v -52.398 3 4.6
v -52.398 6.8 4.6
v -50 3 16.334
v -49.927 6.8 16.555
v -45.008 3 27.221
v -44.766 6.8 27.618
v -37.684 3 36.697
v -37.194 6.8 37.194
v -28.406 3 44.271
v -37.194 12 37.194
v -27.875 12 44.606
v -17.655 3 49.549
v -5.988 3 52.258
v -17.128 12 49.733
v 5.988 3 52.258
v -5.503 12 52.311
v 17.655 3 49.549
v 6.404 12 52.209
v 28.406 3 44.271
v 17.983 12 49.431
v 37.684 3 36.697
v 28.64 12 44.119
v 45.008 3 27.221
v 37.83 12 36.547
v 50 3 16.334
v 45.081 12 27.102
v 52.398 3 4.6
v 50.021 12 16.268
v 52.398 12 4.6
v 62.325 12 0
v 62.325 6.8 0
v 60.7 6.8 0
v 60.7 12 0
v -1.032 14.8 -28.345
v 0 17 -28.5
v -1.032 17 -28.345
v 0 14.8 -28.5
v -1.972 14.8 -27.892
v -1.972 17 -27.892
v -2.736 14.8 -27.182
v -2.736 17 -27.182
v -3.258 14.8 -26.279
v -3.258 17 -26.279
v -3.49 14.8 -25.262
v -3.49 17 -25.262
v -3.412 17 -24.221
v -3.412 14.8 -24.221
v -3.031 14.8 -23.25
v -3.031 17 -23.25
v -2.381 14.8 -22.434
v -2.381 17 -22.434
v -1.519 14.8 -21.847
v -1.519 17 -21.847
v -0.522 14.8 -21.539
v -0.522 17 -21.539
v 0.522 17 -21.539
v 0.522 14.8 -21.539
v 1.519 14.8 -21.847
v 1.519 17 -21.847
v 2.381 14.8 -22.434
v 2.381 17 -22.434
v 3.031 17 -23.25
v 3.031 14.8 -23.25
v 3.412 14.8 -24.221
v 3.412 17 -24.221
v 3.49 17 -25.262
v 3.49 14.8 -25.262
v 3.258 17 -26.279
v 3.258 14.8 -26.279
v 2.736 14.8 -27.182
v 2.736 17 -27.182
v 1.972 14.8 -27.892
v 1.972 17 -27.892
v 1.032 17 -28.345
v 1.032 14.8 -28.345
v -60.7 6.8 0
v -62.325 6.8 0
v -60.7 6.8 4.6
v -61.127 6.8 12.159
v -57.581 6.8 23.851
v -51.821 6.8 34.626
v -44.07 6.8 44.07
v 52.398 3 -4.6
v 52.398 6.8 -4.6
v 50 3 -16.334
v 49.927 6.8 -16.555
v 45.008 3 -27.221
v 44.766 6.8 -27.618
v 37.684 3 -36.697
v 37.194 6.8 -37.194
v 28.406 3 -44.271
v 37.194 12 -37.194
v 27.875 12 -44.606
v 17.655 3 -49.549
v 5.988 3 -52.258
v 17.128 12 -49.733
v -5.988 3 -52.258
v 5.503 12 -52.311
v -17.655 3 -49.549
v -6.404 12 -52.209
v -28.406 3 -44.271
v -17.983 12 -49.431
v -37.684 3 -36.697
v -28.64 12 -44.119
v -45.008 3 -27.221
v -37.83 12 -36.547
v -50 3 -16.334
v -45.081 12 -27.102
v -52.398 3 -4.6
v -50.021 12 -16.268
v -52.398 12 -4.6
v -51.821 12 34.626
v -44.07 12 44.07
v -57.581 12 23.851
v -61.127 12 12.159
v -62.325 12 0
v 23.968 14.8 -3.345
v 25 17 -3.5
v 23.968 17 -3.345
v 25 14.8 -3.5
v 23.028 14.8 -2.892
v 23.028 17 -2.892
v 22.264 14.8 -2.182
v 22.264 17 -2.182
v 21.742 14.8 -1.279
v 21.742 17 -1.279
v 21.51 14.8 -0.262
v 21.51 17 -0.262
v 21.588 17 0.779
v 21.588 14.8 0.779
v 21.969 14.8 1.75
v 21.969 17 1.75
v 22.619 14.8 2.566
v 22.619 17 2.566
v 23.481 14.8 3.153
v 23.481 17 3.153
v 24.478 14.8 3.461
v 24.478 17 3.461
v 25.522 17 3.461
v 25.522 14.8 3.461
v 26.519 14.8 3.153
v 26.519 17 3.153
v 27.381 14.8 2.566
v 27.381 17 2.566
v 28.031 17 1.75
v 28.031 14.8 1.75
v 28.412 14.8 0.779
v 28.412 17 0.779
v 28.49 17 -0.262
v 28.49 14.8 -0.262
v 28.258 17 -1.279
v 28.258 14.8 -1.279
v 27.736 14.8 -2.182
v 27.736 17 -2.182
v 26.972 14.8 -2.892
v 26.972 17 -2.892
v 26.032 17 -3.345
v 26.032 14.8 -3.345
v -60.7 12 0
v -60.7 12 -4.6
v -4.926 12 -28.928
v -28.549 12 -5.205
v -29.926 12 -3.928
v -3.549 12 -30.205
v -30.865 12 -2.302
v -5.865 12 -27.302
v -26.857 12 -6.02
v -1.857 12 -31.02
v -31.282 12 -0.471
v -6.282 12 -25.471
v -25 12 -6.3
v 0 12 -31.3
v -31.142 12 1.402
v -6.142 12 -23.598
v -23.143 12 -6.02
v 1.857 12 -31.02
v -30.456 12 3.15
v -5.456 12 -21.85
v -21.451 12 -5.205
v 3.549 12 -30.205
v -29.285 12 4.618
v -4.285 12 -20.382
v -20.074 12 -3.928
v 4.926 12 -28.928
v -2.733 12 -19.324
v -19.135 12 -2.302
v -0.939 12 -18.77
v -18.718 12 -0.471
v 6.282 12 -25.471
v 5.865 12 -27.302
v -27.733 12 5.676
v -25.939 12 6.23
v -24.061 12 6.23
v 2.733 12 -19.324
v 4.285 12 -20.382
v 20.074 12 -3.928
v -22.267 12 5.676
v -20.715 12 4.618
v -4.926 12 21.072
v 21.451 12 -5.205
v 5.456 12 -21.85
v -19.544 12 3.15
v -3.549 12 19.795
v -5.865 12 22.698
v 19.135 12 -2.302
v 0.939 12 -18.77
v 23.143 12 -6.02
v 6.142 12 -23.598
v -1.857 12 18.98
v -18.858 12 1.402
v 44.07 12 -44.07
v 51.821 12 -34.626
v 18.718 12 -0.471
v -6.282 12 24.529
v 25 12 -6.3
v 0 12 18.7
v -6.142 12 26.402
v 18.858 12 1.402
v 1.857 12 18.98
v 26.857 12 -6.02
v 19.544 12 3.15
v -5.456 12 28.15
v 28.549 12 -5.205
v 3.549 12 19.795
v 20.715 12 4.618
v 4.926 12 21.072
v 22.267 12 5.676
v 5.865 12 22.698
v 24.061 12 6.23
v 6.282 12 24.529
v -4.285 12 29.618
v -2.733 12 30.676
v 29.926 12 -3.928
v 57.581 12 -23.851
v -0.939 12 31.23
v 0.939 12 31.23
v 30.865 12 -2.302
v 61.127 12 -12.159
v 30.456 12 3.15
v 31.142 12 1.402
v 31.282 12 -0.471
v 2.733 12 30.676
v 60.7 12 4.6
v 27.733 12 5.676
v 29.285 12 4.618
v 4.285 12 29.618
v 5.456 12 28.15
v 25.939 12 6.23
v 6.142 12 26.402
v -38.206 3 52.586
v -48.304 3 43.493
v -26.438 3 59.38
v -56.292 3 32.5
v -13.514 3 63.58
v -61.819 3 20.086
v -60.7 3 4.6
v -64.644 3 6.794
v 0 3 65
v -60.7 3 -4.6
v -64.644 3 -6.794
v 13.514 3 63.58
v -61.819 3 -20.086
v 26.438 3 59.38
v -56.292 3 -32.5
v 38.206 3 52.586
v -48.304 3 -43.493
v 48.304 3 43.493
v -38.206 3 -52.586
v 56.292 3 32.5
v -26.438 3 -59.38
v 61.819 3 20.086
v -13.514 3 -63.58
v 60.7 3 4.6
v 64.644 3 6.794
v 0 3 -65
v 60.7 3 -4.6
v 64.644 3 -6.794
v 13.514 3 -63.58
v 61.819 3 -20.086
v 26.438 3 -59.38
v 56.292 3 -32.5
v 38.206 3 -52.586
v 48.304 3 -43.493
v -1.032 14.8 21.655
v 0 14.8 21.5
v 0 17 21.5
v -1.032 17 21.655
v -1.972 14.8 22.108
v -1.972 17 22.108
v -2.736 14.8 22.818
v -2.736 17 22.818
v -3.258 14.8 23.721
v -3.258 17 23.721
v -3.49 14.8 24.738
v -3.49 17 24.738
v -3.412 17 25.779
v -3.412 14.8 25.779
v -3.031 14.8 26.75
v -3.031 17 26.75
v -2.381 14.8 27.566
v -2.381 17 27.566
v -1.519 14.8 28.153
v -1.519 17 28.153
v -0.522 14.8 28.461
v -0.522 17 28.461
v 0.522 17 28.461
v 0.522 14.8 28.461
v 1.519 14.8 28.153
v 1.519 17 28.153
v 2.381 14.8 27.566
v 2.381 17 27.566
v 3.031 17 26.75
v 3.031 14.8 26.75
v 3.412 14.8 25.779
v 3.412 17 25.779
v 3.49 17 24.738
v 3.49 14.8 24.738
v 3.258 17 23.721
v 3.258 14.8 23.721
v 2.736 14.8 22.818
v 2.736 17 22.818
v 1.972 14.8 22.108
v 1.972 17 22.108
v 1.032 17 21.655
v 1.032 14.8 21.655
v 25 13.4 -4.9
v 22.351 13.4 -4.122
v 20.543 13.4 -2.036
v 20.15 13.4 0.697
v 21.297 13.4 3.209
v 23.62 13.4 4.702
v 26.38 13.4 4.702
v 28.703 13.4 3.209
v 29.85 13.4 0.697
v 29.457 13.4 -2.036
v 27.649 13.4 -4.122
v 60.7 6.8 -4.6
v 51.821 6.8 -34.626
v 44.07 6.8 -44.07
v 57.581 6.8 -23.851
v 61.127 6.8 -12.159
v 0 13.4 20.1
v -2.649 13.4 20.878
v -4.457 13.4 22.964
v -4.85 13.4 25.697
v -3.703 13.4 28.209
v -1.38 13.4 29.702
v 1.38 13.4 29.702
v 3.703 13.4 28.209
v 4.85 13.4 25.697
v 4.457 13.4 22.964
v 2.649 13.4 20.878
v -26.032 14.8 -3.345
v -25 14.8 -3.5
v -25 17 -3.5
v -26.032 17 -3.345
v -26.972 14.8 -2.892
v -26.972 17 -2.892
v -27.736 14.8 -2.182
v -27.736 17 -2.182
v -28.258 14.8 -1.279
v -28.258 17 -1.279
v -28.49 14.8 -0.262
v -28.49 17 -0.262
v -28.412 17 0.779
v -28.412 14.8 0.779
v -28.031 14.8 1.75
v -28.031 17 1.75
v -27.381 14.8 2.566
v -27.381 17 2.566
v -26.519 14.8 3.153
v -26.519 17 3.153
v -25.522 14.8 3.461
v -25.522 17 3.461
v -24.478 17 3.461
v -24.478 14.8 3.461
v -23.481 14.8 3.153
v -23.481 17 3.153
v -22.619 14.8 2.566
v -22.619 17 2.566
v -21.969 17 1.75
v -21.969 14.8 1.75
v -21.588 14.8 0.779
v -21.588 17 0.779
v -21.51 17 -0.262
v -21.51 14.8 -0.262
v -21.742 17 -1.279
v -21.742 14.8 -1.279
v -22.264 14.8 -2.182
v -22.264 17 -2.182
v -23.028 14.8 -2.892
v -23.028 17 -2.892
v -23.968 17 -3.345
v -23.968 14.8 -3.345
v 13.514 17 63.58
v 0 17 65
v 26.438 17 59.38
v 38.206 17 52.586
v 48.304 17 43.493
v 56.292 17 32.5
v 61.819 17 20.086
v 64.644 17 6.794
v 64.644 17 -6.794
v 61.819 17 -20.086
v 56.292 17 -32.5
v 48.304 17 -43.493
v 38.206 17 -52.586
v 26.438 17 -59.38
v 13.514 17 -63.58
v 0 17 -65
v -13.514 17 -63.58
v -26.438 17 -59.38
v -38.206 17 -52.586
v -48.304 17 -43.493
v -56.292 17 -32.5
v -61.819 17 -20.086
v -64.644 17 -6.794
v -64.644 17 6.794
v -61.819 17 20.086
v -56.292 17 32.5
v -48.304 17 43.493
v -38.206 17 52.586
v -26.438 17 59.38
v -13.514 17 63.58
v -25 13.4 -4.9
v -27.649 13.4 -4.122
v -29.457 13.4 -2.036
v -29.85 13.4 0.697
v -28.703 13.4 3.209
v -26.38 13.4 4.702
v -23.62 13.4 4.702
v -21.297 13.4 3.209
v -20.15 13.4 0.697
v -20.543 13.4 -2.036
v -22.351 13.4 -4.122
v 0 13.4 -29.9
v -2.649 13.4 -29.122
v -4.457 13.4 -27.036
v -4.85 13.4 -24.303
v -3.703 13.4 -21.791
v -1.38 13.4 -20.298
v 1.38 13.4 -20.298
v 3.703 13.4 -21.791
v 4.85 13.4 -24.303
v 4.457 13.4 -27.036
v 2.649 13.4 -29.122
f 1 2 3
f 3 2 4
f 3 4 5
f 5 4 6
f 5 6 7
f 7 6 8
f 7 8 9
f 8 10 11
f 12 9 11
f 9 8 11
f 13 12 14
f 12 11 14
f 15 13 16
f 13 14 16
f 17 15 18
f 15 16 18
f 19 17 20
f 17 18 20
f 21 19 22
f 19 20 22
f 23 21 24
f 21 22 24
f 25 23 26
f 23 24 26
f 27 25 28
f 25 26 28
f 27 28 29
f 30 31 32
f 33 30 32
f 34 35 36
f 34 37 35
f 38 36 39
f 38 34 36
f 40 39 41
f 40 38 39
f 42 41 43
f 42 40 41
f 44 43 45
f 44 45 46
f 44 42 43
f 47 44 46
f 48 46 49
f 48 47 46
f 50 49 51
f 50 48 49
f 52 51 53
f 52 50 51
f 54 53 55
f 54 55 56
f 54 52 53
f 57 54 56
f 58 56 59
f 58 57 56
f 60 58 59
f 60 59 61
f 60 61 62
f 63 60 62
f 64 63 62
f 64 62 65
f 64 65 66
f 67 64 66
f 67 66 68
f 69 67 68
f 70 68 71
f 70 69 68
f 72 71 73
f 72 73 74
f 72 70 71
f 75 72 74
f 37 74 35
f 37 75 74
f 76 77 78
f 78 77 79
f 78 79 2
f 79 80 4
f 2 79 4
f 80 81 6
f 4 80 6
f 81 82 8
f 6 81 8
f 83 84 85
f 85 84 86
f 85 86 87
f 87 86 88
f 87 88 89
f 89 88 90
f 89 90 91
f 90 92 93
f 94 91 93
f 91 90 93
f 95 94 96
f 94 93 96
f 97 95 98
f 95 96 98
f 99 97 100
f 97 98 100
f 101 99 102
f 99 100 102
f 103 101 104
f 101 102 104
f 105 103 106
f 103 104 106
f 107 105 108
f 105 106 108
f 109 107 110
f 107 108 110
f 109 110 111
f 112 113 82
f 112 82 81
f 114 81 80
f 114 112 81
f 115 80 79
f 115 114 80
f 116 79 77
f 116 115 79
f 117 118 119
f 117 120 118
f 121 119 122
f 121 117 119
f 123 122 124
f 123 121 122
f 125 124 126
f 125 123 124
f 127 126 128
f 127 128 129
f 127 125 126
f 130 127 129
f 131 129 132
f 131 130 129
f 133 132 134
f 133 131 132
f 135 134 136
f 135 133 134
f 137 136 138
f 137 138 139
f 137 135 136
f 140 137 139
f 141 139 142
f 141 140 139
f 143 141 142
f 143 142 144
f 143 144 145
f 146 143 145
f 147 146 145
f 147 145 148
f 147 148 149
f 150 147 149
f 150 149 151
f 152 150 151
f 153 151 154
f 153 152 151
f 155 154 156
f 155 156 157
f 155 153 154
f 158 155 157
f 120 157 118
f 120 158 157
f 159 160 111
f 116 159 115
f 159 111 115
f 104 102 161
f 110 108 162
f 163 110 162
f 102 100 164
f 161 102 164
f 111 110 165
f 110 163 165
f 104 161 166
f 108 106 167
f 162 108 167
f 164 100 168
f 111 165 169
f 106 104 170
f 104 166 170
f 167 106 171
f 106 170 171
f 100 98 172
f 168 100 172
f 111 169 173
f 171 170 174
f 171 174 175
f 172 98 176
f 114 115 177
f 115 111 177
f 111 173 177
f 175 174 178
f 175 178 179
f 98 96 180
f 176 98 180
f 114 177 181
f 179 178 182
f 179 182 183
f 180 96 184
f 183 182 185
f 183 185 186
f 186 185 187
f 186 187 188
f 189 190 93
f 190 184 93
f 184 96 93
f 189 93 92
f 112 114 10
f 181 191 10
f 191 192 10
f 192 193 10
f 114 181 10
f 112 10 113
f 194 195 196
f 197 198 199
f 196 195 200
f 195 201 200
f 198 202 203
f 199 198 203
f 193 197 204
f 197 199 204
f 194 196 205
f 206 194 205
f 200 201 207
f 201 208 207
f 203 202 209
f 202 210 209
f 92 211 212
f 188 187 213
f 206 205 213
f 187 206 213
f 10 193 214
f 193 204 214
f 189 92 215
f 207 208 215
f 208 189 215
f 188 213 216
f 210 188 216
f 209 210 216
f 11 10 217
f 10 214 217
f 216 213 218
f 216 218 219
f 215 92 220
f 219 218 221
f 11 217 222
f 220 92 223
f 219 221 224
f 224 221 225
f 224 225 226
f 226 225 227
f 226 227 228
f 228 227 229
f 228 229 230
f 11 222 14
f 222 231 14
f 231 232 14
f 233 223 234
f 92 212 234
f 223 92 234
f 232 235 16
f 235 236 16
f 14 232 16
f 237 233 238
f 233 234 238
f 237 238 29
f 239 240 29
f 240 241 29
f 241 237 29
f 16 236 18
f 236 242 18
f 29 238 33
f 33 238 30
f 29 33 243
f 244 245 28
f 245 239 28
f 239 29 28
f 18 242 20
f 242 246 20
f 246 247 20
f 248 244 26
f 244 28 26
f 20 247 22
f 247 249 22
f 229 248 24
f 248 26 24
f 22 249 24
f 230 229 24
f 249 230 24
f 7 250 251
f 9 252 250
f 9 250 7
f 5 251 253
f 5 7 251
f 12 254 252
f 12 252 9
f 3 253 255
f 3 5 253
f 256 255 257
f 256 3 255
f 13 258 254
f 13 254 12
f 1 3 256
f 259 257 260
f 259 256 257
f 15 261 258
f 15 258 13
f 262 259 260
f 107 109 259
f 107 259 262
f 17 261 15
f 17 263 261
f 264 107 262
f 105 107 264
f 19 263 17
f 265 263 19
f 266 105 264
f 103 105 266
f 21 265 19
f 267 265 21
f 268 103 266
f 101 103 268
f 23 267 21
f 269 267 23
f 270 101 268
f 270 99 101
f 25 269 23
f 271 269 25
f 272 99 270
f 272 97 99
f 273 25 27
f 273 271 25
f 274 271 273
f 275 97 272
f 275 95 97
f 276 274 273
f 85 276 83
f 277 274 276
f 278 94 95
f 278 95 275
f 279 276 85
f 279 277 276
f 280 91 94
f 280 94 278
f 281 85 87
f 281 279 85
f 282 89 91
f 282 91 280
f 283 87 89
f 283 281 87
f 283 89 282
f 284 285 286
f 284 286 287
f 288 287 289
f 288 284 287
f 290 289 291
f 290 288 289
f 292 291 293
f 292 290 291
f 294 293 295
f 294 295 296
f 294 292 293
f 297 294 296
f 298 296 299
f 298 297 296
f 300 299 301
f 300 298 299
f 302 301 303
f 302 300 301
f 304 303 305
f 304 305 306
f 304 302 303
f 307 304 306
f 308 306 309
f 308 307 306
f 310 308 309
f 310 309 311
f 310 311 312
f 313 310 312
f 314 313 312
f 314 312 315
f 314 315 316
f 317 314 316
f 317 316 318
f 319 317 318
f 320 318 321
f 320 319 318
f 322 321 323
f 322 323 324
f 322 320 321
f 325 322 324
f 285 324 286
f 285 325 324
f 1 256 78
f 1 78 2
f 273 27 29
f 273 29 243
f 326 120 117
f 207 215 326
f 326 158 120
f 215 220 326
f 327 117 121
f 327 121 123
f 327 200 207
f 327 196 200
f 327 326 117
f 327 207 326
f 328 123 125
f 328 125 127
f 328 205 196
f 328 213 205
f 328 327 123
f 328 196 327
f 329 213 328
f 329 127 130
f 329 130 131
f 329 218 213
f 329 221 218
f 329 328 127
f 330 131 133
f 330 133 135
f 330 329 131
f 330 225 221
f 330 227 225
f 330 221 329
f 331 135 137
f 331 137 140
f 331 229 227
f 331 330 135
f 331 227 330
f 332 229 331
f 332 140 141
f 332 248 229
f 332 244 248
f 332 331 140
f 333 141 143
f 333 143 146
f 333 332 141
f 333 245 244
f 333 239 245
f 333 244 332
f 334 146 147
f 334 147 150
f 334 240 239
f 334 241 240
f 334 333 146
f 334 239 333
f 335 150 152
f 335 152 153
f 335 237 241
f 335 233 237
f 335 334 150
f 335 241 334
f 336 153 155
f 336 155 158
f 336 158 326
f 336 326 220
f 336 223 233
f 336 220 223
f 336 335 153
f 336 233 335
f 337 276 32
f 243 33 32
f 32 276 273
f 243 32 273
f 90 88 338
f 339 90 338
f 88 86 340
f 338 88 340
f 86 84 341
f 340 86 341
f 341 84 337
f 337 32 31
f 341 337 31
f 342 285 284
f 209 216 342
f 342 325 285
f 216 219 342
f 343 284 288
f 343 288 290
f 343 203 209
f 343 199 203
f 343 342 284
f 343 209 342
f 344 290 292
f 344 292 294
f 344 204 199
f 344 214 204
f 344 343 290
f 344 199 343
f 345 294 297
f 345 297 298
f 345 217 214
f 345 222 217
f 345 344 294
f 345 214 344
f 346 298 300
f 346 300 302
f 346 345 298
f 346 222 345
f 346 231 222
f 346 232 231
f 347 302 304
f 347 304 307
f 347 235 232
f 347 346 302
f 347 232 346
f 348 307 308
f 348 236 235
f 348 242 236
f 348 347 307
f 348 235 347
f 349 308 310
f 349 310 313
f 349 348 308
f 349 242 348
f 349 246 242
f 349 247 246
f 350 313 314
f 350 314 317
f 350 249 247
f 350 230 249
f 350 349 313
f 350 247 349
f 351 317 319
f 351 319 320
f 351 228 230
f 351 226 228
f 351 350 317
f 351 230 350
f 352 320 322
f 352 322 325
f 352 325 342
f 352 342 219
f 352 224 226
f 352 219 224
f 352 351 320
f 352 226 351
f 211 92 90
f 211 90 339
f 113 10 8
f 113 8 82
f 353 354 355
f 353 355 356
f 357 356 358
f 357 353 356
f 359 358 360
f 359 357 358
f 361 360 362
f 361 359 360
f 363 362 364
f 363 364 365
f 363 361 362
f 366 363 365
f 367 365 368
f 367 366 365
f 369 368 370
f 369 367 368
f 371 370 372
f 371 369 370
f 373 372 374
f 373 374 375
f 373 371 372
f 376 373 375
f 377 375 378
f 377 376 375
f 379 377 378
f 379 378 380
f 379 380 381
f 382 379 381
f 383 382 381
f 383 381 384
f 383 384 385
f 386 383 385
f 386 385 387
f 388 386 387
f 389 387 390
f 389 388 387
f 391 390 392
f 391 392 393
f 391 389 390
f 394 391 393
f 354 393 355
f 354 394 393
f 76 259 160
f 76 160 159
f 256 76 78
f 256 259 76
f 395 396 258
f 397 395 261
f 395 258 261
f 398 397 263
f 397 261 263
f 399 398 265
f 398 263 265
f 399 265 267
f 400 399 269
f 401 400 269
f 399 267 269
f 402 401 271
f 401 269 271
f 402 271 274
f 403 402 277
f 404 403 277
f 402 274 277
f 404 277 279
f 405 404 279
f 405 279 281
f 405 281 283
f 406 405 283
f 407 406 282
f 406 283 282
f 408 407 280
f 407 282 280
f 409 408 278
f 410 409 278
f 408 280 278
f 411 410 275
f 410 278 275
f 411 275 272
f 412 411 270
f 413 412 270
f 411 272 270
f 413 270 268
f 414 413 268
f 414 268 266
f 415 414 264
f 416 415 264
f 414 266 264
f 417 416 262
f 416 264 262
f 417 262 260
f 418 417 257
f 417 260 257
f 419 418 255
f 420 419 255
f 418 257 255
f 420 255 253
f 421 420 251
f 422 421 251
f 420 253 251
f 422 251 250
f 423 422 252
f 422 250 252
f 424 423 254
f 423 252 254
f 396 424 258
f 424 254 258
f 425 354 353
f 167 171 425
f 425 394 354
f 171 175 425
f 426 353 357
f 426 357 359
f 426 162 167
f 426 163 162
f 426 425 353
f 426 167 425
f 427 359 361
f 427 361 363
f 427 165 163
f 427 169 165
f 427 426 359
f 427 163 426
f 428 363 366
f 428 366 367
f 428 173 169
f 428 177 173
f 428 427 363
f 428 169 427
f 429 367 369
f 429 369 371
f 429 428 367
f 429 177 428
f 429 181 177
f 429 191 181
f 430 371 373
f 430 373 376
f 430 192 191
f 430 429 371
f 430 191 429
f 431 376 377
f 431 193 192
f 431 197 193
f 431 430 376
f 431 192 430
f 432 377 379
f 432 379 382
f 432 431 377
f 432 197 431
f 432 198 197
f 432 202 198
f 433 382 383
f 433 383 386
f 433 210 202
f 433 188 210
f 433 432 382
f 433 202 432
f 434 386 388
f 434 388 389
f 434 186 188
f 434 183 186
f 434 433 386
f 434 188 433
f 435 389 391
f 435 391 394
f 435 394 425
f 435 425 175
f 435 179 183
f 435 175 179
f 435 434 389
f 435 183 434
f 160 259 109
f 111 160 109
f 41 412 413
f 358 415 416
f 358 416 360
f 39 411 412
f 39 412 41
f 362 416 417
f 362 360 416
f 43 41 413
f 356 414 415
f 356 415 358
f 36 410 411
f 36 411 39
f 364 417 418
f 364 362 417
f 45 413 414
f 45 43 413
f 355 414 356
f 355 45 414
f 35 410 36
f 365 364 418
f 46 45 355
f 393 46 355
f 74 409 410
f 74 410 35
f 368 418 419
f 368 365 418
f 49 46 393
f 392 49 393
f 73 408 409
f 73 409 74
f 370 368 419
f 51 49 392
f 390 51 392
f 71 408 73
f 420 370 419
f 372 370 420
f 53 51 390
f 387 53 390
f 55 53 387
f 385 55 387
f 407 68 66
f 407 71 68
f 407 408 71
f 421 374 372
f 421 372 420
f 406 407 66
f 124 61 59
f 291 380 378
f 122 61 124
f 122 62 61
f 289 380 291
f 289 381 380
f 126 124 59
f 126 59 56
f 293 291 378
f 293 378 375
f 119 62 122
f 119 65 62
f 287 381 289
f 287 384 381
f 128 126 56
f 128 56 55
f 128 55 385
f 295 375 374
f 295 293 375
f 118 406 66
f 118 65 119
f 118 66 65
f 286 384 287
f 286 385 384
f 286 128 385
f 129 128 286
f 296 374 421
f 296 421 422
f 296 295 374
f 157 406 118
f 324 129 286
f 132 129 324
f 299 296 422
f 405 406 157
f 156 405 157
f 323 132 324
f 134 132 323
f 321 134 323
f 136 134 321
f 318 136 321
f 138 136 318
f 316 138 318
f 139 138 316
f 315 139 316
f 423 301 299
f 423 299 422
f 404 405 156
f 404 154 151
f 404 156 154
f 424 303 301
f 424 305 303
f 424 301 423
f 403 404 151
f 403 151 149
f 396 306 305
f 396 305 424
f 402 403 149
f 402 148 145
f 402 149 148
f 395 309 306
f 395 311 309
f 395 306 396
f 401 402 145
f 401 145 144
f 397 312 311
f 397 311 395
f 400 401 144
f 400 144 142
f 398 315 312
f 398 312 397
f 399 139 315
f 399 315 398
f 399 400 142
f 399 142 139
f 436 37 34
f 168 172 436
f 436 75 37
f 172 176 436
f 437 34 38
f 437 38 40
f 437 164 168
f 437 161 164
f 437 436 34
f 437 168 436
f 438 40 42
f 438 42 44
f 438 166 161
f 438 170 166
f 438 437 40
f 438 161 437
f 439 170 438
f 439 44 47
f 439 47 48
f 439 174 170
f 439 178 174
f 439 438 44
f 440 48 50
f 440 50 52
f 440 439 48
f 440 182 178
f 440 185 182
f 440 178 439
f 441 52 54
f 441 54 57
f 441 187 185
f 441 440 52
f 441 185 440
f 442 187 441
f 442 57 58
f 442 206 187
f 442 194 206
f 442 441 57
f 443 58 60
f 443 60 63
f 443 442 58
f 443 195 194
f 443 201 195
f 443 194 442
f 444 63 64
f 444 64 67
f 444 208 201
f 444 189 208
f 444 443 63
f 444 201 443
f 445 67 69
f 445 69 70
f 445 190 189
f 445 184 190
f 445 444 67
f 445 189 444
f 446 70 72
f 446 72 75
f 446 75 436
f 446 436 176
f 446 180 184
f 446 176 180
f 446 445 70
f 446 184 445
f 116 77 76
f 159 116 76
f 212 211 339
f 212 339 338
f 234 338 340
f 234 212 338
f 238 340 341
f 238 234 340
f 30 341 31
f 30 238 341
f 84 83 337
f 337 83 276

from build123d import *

# Parameters (mm, degrees)
SKETCH1_R                                    = 65
BOSS_EXTRUDE2_DEPTH                          = 30
SKETCH2_R                                    = 52.6
CUT_EXTRUDE1_DEPTH                           = 84
SKETCH4_R                                    = 52.6
BOSS_EXTRUDE3_DEPTH                          = 5
SKETCH5_W                                    = 16.2
SKETCH5_H                                    = 9.2
CUT_EXTRUDE2_DEPTH                           = 12
CUT_EXTRUDE3_DEPTH                           = 5.2
M6_CLEARANCE_HOLE1_D                         = 7
CUT_EXTRUDE4_START                           = -18
SKETCH11_R                                   = 65
CUT_EXTRUDE4_DEPTH                           = 18
SKETCH12_R                                   = 65
BOSS_EXTRUDE4_DEPTH                          = 5
CSK_FOR_M6_COUNTERSUNK_FLAT_HEAD_SCR_2_COUNT = 2
CSK_FOR_M6_COUNTERSUNK_FLAT_HEAD_SCR_2_PITCH = 35.355339059
CSK_FOR_M6_COUNTERSUNK_FLAT_HEAD_SCR_3_COUNT = 2
CSK_FOR_M6_COUNTERSUNK_FLAT_HEAD_SCR_3_PITCH = 50
CSK_FOR_M6_COUNTERSUNK_FLAT_HEAD_SCR_4_COUNT = 2
CSK_FOR_M6_COUNTERSUNK_FLAT_HEAD_SCR_4_PITCH = 50
CSK_FOR_M6_COUNTERSUNK_FLAT_HEAD_SCR_5_COUNT = 2
CSK_FOR_M6_COUNTERSUNK_FLAT_HEAD_SCR_5_PITCH = 35.355339059
CSK_FOR_M6_COUNTERSUNK_FLAT_HEAD_SCR_6_COUNT = 2
CSK_FOR_M6_COUNTERSUNK_FLAT_HEAD_SCR_6_PITCH = 35.355339059
CUT_EXTRUDE5_START                           = -3
SKETCH22_R                                   = 65
CUT_EXTRUDE5_DEPTH                           = 3


with BuildPart() as part:
    # Sketch1 → Boss-Extrude2 (new body)
    with BuildSketch(Plane(origin=(0, 0, 0), x_dir=(1, 0, 0), z_dir=(0, 1, 0))):
        with Locations(Location((0, 0, 0), (0, 0, 270))):
            Circle(SKETCH1_R)
    extrude(amount=BOSS_EXTRUDE2_DEPTH)

    # Sketch2 → Cut-Extrude1 (cut)
    with BuildSketch(Plane(origin=(0, 30, 0), x_dir=(1, 0, 0), z_dir=(0, 1, 0))):
        with Locations(Location((0, 0, 0), (0, 0, 270))):
            Circle(SKETCH2_R)
    extrude(amount=-CUT_EXTRUDE1_DEPTH, mode=Mode.SUBTRACT)

    # Sketch4 → Boss-Extrude3 (add)
    with BuildSketch(Plane(origin=(0, 30, 0), x_dir=(1, 0, 0), z_dir=(0, 1, 0))):
        with Locations(Location((0, 0, 0), (0, 0, 270))):
            Circle(SKETCH4_R)
    extrude(amount=-BOSS_EXTRUDE3_DEPTH)

    # Sketch5 → Cut-Extrude2 (cut)
    with BuildSketch(Plane.XZ):
        with Locations((-52.6, 0)):
            Rectangle(SKETCH5_W, SKETCH5_H)
        with Locations((52.6, 0)):
            Rectangle(SKETCH5_W, SKETCH5_H)
    extrude(amount=-CUT_EXTRUDE2_DEPTH, mode=Mode.SUBTRACT)

    # Sketch7 → Cut-Extrude3 (cut)
    with BuildSketch(Plane.XZ.offset(-12)):
        with BuildLine():
            Line((37.19381669, -37.19381669), (44.070308528, -44.070308528))
            ThreePointArc((44.070308528, -44.070308528), (57.580632973, -23.850679107), (62.324828018, 0))
            Line((62.324828018, 0), (52.6, 0))
            ThreePointArc((52.6, 0), (48.59606341, -20.129148542), (37.19381669, -37.19381669))
        make_face()
        with BuildLine():
            Line((-37.19381669, 37.19381669), (-44.070308528, 44.070308528))
            ThreePointArc((-44.070308528, 44.070308528), (-57.580632973, 23.850679107), (-62.324828018, 0))
            Line((-62.324828018, 0), (-52.6, 0))
            ThreePointArc((-52.6, 0), (-48.59606341, 20.129148542), (-37.19381669, 37.19381669))
        make_face()
    extrude(amount=CUT_EXTRUDE3_DEPTH, mode=Mode.SUBTRACT)

    # M6 Clearance Hole1 (through all)
    with Locations(Plane(origin=(0, 30, -25), x_dir=(0, 0, 1), z_dir=(0, 1, 0))):
        with Locations((0, 0), (25, -25), (25, 25), (50, 0)):
            Hole(M6_CLEARANCE_HOLE1_D / 2)

    # Sketch11 → Cut-Extrude4 (cut)
    with BuildSketch(Plane(origin=(0, 30, 0), x_dir=(1, 0, 0), z_dir=(0, 1, 0)).offset(CUT_EXTRUDE4_START)):
        with Locations(Location((0, 0, 0), (0, 0, 270))):
            Circle(SKETCH11_R)
    extrude(amount=CUT_EXTRUDE4_DEPTH, mode=Mode.SUBTRACT)

    # Sketch12 → Boss-Extrude4 (add)
    with BuildSketch(Plane(origin=(0, 12, 0), x_dir=(1, 0, 0), z_dir=(0, 1, 0))):
        with Locations(Location((0, 0, 0), (0, 0, 270))):
            Circle(SKETCH12_R)
    extrude(amount=BOSS_EXTRUDE4_DEPTH)

    # Sketch21 → CSK for M6 Countersunk Flat Head Screw3 (revolve, cut)
    with BuildSketch(Plane(origin=(25, 12, 0), x_dir=(0, 0, -1), z_dir=(1, 0, 0))):
        Polygon((0, 0), (0, 5), (3.5, 5), (3.5, 2.8), (6.3, 0), align=None)
    csk_for_m6_countersunk_flat_head_screw3 = revolve(axis=Axis((25, 5.65, 0), (0, 1, 0)), mode=Mode.SUBTRACT)

    # CSK for M6 Countersunk Flat Head Scr 2: CSK for M6 Countersunk Flat Head Screw3 ×2
    with Locations(*[Vector(-0.7071067811865476, 0, 0.7071067811865476) * (i * CSK_FOR_M6_COUNTERSUNK_FLAT_HEAD_SCR_2_PITCH) for i in range(1, CSK_FOR_M6_COUNTERSUNK_FLAT_HEAD_SCR_2_COUNT)]):
        add(csk_for_m6_countersunk_flat_head_screw3, mode=Mode.SUBTRACT)

    # CSK for M6 Countersunk Flat Head Scr 3: CSK for M6 Countersunk Flat Head Screw3 ×2
    with Locations(*[(-i * CSK_FOR_M6_COUNTERSUNK_FLAT_HEAD_SCR_3_PITCH, 0, 0) for i in range(1, CSK_FOR_M6_COUNTERSUNK_FLAT_HEAD_SCR_3_COUNT)]):
        add(csk_for_m6_countersunk_flat_head_screw3, mode=Mode.SUBTRACT)

    # CSK for M6 Countersunk Flat Head Scr 4: CSK for M6 Countersunk Flat Head Screw3 ×2
    with Locations(*[(-i * CSK_FOR_M6_COUNTERSUNK_FLAT_HEAD_SCR_4_PITCH, 0, 0) for i in range(1, CSK_FOR_M6_COUNTERSUNK_FLAT_HEAD_SCR_4_COUNT)]):
        add(csk_for_m6_countersunk_flat_head_screw3, mode=Mode.SUBTRACT)

    # CSK for M6 Countersunk Flat Head Scr 5: CSK for M6 Countersunk Flat Head Screw3 ×2
    with Locations(*[Vector(-0.7071067811865476, 0, 0.7071067811865476) * (i * CSK_FOR_M6_COUNTERSUNK_FLAT_HEAD_SCR_5_PITCH) for i in range(1, CSK_FOR_M6_COUNTERSUNK_FLAT_HEAD_SCR_5_COUNT)]):
        add(csk_for_m6_countersunk_flat_head_screw3, mode=Mode.SUBTRACT)

    # CSK for M6 Countersunk Flat Head Scr 6: CSK for M6 Countersunk Flat Head Screw3 ×2
    with Locations(*[Vector(-0.7071067811865476, 0, -0.7071067811865476) * (i * CSK_FOR_M6_COUNTERSUNK_FLAT_HEAD_SCR_6_PITCH) for i in range(1, CSK_FOR_M6_COUNTERSUNK_FLAT_HEAD_SCR_6_COUNT)]):
        add(csk_for_m6_countersunk_flat_head_screw3, mode=Mode.SUBTRACT)

    # Sketch22 → Cut-Extrude5 (cut)
    with BuildSketch(Plane.XZ.offset(CUT_EXTRUDE5_START)):
        with Locations(Location((0, 0, 0), (0, 0, 270))):
            Circle(SKETCH22_R)
        with BuildLine():
            Line((-52.39847326, 4.6), (-60.7, 4.6))
            Line((-60.7, 4.6), (-60.7, -4.6))
            Line((-60.7, -4.6), (-52.39847326, -4.6))
            ThreePointArc((-52.39847326, -4.6), (0, -52.6), (52.39847326, -4.6))
            Line((52.39847326, -4.6), (60.7, -4.6))
            Line((60.7, -4.6), (60.7, 4.6))
            Line((60.7, 4.6), (52.39847326, 4.6))
            ThreePointArc((52.39847326, 4.6), (0, 52.6), (-52.39847326, 4.6))
        make_face(mode=Mode.SUBTRACT)
    extrude(amount=CUT_EXTRUDE5_DEPTH, mode=Mode.SUBTRACT)


solid = part.part
